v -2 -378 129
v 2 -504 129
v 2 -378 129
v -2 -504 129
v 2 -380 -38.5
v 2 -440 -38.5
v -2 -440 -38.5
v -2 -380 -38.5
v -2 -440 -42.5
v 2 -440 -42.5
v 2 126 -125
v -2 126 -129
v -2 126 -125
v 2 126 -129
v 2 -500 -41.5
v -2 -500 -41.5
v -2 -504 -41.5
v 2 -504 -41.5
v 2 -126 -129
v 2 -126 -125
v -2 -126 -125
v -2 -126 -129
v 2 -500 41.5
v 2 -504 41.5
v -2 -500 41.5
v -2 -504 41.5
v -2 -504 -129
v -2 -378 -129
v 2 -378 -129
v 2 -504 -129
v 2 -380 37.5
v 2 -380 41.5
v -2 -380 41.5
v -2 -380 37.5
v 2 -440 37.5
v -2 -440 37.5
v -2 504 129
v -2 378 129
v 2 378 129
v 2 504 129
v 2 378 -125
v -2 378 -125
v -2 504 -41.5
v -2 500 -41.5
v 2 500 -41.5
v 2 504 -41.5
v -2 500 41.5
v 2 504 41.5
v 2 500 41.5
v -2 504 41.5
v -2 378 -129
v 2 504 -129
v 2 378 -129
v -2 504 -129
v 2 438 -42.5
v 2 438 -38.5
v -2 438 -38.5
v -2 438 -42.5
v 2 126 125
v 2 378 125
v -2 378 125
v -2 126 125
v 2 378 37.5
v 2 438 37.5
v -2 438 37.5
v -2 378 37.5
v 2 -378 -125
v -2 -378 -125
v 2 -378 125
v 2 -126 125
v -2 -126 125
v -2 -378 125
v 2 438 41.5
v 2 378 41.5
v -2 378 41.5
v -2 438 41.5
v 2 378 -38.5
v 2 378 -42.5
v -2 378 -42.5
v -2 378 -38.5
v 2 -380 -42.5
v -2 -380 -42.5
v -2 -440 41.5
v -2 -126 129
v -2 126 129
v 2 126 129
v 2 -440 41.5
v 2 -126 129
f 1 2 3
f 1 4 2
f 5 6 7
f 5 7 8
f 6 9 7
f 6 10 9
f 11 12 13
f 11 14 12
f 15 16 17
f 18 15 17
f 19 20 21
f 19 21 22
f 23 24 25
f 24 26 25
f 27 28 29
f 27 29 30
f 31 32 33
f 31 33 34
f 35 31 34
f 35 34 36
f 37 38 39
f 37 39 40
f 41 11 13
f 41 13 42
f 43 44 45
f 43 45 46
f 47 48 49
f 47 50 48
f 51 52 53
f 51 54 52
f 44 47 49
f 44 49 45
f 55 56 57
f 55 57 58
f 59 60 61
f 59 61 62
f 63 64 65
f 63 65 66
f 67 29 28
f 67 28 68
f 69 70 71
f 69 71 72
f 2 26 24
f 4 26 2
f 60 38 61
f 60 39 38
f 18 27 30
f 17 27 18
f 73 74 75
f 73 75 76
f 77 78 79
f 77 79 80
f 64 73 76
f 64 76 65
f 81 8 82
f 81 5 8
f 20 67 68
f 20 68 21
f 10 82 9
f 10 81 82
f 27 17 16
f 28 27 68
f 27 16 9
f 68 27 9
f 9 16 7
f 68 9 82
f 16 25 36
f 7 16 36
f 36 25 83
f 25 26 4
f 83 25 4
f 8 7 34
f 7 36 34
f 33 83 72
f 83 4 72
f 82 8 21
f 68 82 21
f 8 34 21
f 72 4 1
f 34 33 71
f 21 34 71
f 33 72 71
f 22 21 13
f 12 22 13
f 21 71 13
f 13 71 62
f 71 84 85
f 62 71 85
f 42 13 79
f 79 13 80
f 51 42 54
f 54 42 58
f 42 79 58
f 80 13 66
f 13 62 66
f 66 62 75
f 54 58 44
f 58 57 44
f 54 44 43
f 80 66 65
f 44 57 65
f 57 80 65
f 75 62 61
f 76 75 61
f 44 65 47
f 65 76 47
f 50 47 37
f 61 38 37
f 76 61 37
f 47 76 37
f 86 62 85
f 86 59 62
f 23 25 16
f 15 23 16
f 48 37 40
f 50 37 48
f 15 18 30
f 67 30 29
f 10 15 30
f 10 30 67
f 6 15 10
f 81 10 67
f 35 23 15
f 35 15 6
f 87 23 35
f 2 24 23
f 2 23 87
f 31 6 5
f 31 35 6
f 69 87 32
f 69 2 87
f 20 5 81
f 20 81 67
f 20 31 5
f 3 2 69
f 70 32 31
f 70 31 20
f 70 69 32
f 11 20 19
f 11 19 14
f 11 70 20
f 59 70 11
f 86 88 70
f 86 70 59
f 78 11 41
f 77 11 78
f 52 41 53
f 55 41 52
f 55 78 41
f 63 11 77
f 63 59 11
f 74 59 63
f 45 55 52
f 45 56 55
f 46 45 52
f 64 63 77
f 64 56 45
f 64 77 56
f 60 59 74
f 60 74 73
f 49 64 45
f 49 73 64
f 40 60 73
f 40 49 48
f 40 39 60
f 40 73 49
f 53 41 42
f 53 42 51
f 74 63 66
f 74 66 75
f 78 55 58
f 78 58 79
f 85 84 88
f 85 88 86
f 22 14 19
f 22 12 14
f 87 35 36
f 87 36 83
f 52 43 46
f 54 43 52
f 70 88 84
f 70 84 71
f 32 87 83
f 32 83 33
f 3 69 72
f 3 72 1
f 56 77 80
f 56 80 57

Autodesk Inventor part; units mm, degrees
ref_plane "YZ Plane" through (0, 0, 0) normal (1, 0, 0) x (0, 1, 0)
ref_plane "XZ Plane" through (0, 0, 0) normal (0, 1, 0) x (-1, 0, 0)
ref_plane "XY Plane" through (0, 0, 0) normal (0, 0, 1) x (1, 0, 0)
sketch "Esboço1" plane through (0, 0, 0) normal (1, 0, 0) x (0, 1, 0)
  line L0 (-504, 129) -> (504, 129)
  line L1 (504, 129) -> (504, -129)
  line L2 (504, -129) -> (-504, -129)
  line L3 (-504, -129) -> (-504, 129)
  line L4 (-504, 129) -> (504, -129) construction
  line L5 (504, 129) -> (-504, -129) construction
  point P0 (0, 0)
  dimension "d0" = 1008
  dimension "d1" = 258
extrude "Extrusão1" add sketch "Esboço1" along normal mid plane 4
sketch "Esboço2" plane through (2, 0, 0) normal (1, 0, 0) x (0, 0, -1)
  line L0 (-133, 378) -> (-125, 378)
  line L1 (-125, 378) -> (-125, 126)
  line L2 (-125, 126) -> (-133, 126)
  line L3 (-133, 126) -> (-133, 378)
  line L4 (-129, 504) -> (-129, -504) projected
  line L5 (-133, 378) -> (-125, 126) construction
  line L6 (-125, 378) -> (-133, 126) construction
  line L7 (129, 504) -> (-129, 504) projected
  line L8 (-133, -126) -> (-125, -126)
  line L9 (-125, -126) -> (-125, -378)
  line L10 (-125, -378) -> (-133, -378)
  line L11 (-133, -378) -> (-133, -126)
  line L12 (-133, -126) -> (-125, -378) construction
  line L13 (-125, -126) -> (-133, -378) construction
  line L14 (-129, -504) -> (129, -504) projected
  line L15 (125, 378) -> (133, 378)
  line L16 (133, 378) -> (133, 126)
  line L17 (133, 126) -> (125, 126)
  line L18 (125, 126) -> (125, 378)
  line L19 (129, -504) -> (129, 504) projected
  line L20 (125, 378) -> (133, 126) construction
  line L21 (133, 378) -> (125, 126) construction
  line L22 (125, -126) -> (133, -126)
  line L23 (133, -126) -> (133, -378)
  line L24 (133, -378) -> (125, -378)
  line L25 (125, -378) -> (125, -126)
  line L26 (125, -126) -> (133, -378) construction
  line L27 (133, -126) -> (125, -378) construction
  point P0 (0, 0)
  point P1 (-129, 252)
  point P2 (-129, -252)
  point P3 (129, 252)
  point P4 (129, -252)
  dimension "d4" = 8
  dimension "d5" = 252
  dimension "d6" = 126
  dimension "d7" = 8
  dimension "d8" = 252
  dimension "d9" = 252
  dimension "d10" = 126
  dimension "d11" = 126
  dimension "d12" = 252
  dimension "d13" = 8
  dimension "d14" = 252
  dimension "d15" = 8
  dimension "d16" = 252
  dimension "d17" = 126
extrude "Extrusão2" cut sketch "Esboço2" along normal through all both and the other way through all contours L0 L4 L2 L3 | L0 L1 L2 L4 | L8 L9 L10 L4 | L4 L10 L11 L8 | L19 L17 L18 L15 | L15 L16 L17 L19 | L22 L23 L24 L19 | L19 L24 L25 L22
sketch "Esboço3" plane through (2, 0, 0) normal (1, 0, 0) x (0, 0, -1)
  line L0 (-41.5, 500) -> (41.5, 500)
  line L1 (41.5, 500) -> (41.5, 508)
  line L2 (41.5, 508) -> (-41.5, 508)
  line L3 (-41.5, 508) -> (-41.5, 500)
  line L4 (129, 504) -> (-129, 504) projected
  line L5 (-41.5, 500) -> (41.5, 508) construction
  line L6 (41.5, 500) -> (-41.5, 508) construction
  line L7 (-41.5, -500) -> (41.5, -500)
  line L8 (41.5, -500) -> (41.5, -508)
  line L9 (41.5, -508) -> (-41.5, -508)
  line L10 (-41.5, -508) -> (-41.5, -500)
  line L11 (-129, -504) -> (129, -504) projected
  line L12 (-41.5, -500) -> (41.5, -508) construction
  line L13 (41.5, -500) -> (-41.5, -508) construction
  point P0 (0, 0)
  point P1 (0, 504)
  point P2 (0, -504)
  dimension "d20" = 83
  dimension "d21" = 8
  dimension "d22" = 83
  dimension "d23" = 8
extrude "Extrusão3" cut sketch "Esboço3" along normal through all both and the other way through all
sketch "Esboço4" plane through (2, 0, 0) normal (1, 0, 0) x (0, 0, -1)
  line L0 (41.5, 500) -> (-41.5, 500) projected
  line L1 (-41.5, 438) -> (-37.5, 438)
  line L2 (-37.5, 438) -> (-37.5, 378)
  line L3 (-37.5, 378) -> (-41.5, 378)
  line L4 (-41.5, 378) -> (-41.5, 438)
  point P0 (0, 0)
  dimension "d26" = 62
  dimension "d27" = 4
  dimension "d28" = 60
extrude "Extrusão4" cut sketch "Esboço4" against normal through all
pattern_linear "Padrão retangular1" count 2 spacing 80 along (0, 0, -1) count 2 spacing 818 along (0, -1, 0) of "Extrusão4"
properties part number "FUNDO"
